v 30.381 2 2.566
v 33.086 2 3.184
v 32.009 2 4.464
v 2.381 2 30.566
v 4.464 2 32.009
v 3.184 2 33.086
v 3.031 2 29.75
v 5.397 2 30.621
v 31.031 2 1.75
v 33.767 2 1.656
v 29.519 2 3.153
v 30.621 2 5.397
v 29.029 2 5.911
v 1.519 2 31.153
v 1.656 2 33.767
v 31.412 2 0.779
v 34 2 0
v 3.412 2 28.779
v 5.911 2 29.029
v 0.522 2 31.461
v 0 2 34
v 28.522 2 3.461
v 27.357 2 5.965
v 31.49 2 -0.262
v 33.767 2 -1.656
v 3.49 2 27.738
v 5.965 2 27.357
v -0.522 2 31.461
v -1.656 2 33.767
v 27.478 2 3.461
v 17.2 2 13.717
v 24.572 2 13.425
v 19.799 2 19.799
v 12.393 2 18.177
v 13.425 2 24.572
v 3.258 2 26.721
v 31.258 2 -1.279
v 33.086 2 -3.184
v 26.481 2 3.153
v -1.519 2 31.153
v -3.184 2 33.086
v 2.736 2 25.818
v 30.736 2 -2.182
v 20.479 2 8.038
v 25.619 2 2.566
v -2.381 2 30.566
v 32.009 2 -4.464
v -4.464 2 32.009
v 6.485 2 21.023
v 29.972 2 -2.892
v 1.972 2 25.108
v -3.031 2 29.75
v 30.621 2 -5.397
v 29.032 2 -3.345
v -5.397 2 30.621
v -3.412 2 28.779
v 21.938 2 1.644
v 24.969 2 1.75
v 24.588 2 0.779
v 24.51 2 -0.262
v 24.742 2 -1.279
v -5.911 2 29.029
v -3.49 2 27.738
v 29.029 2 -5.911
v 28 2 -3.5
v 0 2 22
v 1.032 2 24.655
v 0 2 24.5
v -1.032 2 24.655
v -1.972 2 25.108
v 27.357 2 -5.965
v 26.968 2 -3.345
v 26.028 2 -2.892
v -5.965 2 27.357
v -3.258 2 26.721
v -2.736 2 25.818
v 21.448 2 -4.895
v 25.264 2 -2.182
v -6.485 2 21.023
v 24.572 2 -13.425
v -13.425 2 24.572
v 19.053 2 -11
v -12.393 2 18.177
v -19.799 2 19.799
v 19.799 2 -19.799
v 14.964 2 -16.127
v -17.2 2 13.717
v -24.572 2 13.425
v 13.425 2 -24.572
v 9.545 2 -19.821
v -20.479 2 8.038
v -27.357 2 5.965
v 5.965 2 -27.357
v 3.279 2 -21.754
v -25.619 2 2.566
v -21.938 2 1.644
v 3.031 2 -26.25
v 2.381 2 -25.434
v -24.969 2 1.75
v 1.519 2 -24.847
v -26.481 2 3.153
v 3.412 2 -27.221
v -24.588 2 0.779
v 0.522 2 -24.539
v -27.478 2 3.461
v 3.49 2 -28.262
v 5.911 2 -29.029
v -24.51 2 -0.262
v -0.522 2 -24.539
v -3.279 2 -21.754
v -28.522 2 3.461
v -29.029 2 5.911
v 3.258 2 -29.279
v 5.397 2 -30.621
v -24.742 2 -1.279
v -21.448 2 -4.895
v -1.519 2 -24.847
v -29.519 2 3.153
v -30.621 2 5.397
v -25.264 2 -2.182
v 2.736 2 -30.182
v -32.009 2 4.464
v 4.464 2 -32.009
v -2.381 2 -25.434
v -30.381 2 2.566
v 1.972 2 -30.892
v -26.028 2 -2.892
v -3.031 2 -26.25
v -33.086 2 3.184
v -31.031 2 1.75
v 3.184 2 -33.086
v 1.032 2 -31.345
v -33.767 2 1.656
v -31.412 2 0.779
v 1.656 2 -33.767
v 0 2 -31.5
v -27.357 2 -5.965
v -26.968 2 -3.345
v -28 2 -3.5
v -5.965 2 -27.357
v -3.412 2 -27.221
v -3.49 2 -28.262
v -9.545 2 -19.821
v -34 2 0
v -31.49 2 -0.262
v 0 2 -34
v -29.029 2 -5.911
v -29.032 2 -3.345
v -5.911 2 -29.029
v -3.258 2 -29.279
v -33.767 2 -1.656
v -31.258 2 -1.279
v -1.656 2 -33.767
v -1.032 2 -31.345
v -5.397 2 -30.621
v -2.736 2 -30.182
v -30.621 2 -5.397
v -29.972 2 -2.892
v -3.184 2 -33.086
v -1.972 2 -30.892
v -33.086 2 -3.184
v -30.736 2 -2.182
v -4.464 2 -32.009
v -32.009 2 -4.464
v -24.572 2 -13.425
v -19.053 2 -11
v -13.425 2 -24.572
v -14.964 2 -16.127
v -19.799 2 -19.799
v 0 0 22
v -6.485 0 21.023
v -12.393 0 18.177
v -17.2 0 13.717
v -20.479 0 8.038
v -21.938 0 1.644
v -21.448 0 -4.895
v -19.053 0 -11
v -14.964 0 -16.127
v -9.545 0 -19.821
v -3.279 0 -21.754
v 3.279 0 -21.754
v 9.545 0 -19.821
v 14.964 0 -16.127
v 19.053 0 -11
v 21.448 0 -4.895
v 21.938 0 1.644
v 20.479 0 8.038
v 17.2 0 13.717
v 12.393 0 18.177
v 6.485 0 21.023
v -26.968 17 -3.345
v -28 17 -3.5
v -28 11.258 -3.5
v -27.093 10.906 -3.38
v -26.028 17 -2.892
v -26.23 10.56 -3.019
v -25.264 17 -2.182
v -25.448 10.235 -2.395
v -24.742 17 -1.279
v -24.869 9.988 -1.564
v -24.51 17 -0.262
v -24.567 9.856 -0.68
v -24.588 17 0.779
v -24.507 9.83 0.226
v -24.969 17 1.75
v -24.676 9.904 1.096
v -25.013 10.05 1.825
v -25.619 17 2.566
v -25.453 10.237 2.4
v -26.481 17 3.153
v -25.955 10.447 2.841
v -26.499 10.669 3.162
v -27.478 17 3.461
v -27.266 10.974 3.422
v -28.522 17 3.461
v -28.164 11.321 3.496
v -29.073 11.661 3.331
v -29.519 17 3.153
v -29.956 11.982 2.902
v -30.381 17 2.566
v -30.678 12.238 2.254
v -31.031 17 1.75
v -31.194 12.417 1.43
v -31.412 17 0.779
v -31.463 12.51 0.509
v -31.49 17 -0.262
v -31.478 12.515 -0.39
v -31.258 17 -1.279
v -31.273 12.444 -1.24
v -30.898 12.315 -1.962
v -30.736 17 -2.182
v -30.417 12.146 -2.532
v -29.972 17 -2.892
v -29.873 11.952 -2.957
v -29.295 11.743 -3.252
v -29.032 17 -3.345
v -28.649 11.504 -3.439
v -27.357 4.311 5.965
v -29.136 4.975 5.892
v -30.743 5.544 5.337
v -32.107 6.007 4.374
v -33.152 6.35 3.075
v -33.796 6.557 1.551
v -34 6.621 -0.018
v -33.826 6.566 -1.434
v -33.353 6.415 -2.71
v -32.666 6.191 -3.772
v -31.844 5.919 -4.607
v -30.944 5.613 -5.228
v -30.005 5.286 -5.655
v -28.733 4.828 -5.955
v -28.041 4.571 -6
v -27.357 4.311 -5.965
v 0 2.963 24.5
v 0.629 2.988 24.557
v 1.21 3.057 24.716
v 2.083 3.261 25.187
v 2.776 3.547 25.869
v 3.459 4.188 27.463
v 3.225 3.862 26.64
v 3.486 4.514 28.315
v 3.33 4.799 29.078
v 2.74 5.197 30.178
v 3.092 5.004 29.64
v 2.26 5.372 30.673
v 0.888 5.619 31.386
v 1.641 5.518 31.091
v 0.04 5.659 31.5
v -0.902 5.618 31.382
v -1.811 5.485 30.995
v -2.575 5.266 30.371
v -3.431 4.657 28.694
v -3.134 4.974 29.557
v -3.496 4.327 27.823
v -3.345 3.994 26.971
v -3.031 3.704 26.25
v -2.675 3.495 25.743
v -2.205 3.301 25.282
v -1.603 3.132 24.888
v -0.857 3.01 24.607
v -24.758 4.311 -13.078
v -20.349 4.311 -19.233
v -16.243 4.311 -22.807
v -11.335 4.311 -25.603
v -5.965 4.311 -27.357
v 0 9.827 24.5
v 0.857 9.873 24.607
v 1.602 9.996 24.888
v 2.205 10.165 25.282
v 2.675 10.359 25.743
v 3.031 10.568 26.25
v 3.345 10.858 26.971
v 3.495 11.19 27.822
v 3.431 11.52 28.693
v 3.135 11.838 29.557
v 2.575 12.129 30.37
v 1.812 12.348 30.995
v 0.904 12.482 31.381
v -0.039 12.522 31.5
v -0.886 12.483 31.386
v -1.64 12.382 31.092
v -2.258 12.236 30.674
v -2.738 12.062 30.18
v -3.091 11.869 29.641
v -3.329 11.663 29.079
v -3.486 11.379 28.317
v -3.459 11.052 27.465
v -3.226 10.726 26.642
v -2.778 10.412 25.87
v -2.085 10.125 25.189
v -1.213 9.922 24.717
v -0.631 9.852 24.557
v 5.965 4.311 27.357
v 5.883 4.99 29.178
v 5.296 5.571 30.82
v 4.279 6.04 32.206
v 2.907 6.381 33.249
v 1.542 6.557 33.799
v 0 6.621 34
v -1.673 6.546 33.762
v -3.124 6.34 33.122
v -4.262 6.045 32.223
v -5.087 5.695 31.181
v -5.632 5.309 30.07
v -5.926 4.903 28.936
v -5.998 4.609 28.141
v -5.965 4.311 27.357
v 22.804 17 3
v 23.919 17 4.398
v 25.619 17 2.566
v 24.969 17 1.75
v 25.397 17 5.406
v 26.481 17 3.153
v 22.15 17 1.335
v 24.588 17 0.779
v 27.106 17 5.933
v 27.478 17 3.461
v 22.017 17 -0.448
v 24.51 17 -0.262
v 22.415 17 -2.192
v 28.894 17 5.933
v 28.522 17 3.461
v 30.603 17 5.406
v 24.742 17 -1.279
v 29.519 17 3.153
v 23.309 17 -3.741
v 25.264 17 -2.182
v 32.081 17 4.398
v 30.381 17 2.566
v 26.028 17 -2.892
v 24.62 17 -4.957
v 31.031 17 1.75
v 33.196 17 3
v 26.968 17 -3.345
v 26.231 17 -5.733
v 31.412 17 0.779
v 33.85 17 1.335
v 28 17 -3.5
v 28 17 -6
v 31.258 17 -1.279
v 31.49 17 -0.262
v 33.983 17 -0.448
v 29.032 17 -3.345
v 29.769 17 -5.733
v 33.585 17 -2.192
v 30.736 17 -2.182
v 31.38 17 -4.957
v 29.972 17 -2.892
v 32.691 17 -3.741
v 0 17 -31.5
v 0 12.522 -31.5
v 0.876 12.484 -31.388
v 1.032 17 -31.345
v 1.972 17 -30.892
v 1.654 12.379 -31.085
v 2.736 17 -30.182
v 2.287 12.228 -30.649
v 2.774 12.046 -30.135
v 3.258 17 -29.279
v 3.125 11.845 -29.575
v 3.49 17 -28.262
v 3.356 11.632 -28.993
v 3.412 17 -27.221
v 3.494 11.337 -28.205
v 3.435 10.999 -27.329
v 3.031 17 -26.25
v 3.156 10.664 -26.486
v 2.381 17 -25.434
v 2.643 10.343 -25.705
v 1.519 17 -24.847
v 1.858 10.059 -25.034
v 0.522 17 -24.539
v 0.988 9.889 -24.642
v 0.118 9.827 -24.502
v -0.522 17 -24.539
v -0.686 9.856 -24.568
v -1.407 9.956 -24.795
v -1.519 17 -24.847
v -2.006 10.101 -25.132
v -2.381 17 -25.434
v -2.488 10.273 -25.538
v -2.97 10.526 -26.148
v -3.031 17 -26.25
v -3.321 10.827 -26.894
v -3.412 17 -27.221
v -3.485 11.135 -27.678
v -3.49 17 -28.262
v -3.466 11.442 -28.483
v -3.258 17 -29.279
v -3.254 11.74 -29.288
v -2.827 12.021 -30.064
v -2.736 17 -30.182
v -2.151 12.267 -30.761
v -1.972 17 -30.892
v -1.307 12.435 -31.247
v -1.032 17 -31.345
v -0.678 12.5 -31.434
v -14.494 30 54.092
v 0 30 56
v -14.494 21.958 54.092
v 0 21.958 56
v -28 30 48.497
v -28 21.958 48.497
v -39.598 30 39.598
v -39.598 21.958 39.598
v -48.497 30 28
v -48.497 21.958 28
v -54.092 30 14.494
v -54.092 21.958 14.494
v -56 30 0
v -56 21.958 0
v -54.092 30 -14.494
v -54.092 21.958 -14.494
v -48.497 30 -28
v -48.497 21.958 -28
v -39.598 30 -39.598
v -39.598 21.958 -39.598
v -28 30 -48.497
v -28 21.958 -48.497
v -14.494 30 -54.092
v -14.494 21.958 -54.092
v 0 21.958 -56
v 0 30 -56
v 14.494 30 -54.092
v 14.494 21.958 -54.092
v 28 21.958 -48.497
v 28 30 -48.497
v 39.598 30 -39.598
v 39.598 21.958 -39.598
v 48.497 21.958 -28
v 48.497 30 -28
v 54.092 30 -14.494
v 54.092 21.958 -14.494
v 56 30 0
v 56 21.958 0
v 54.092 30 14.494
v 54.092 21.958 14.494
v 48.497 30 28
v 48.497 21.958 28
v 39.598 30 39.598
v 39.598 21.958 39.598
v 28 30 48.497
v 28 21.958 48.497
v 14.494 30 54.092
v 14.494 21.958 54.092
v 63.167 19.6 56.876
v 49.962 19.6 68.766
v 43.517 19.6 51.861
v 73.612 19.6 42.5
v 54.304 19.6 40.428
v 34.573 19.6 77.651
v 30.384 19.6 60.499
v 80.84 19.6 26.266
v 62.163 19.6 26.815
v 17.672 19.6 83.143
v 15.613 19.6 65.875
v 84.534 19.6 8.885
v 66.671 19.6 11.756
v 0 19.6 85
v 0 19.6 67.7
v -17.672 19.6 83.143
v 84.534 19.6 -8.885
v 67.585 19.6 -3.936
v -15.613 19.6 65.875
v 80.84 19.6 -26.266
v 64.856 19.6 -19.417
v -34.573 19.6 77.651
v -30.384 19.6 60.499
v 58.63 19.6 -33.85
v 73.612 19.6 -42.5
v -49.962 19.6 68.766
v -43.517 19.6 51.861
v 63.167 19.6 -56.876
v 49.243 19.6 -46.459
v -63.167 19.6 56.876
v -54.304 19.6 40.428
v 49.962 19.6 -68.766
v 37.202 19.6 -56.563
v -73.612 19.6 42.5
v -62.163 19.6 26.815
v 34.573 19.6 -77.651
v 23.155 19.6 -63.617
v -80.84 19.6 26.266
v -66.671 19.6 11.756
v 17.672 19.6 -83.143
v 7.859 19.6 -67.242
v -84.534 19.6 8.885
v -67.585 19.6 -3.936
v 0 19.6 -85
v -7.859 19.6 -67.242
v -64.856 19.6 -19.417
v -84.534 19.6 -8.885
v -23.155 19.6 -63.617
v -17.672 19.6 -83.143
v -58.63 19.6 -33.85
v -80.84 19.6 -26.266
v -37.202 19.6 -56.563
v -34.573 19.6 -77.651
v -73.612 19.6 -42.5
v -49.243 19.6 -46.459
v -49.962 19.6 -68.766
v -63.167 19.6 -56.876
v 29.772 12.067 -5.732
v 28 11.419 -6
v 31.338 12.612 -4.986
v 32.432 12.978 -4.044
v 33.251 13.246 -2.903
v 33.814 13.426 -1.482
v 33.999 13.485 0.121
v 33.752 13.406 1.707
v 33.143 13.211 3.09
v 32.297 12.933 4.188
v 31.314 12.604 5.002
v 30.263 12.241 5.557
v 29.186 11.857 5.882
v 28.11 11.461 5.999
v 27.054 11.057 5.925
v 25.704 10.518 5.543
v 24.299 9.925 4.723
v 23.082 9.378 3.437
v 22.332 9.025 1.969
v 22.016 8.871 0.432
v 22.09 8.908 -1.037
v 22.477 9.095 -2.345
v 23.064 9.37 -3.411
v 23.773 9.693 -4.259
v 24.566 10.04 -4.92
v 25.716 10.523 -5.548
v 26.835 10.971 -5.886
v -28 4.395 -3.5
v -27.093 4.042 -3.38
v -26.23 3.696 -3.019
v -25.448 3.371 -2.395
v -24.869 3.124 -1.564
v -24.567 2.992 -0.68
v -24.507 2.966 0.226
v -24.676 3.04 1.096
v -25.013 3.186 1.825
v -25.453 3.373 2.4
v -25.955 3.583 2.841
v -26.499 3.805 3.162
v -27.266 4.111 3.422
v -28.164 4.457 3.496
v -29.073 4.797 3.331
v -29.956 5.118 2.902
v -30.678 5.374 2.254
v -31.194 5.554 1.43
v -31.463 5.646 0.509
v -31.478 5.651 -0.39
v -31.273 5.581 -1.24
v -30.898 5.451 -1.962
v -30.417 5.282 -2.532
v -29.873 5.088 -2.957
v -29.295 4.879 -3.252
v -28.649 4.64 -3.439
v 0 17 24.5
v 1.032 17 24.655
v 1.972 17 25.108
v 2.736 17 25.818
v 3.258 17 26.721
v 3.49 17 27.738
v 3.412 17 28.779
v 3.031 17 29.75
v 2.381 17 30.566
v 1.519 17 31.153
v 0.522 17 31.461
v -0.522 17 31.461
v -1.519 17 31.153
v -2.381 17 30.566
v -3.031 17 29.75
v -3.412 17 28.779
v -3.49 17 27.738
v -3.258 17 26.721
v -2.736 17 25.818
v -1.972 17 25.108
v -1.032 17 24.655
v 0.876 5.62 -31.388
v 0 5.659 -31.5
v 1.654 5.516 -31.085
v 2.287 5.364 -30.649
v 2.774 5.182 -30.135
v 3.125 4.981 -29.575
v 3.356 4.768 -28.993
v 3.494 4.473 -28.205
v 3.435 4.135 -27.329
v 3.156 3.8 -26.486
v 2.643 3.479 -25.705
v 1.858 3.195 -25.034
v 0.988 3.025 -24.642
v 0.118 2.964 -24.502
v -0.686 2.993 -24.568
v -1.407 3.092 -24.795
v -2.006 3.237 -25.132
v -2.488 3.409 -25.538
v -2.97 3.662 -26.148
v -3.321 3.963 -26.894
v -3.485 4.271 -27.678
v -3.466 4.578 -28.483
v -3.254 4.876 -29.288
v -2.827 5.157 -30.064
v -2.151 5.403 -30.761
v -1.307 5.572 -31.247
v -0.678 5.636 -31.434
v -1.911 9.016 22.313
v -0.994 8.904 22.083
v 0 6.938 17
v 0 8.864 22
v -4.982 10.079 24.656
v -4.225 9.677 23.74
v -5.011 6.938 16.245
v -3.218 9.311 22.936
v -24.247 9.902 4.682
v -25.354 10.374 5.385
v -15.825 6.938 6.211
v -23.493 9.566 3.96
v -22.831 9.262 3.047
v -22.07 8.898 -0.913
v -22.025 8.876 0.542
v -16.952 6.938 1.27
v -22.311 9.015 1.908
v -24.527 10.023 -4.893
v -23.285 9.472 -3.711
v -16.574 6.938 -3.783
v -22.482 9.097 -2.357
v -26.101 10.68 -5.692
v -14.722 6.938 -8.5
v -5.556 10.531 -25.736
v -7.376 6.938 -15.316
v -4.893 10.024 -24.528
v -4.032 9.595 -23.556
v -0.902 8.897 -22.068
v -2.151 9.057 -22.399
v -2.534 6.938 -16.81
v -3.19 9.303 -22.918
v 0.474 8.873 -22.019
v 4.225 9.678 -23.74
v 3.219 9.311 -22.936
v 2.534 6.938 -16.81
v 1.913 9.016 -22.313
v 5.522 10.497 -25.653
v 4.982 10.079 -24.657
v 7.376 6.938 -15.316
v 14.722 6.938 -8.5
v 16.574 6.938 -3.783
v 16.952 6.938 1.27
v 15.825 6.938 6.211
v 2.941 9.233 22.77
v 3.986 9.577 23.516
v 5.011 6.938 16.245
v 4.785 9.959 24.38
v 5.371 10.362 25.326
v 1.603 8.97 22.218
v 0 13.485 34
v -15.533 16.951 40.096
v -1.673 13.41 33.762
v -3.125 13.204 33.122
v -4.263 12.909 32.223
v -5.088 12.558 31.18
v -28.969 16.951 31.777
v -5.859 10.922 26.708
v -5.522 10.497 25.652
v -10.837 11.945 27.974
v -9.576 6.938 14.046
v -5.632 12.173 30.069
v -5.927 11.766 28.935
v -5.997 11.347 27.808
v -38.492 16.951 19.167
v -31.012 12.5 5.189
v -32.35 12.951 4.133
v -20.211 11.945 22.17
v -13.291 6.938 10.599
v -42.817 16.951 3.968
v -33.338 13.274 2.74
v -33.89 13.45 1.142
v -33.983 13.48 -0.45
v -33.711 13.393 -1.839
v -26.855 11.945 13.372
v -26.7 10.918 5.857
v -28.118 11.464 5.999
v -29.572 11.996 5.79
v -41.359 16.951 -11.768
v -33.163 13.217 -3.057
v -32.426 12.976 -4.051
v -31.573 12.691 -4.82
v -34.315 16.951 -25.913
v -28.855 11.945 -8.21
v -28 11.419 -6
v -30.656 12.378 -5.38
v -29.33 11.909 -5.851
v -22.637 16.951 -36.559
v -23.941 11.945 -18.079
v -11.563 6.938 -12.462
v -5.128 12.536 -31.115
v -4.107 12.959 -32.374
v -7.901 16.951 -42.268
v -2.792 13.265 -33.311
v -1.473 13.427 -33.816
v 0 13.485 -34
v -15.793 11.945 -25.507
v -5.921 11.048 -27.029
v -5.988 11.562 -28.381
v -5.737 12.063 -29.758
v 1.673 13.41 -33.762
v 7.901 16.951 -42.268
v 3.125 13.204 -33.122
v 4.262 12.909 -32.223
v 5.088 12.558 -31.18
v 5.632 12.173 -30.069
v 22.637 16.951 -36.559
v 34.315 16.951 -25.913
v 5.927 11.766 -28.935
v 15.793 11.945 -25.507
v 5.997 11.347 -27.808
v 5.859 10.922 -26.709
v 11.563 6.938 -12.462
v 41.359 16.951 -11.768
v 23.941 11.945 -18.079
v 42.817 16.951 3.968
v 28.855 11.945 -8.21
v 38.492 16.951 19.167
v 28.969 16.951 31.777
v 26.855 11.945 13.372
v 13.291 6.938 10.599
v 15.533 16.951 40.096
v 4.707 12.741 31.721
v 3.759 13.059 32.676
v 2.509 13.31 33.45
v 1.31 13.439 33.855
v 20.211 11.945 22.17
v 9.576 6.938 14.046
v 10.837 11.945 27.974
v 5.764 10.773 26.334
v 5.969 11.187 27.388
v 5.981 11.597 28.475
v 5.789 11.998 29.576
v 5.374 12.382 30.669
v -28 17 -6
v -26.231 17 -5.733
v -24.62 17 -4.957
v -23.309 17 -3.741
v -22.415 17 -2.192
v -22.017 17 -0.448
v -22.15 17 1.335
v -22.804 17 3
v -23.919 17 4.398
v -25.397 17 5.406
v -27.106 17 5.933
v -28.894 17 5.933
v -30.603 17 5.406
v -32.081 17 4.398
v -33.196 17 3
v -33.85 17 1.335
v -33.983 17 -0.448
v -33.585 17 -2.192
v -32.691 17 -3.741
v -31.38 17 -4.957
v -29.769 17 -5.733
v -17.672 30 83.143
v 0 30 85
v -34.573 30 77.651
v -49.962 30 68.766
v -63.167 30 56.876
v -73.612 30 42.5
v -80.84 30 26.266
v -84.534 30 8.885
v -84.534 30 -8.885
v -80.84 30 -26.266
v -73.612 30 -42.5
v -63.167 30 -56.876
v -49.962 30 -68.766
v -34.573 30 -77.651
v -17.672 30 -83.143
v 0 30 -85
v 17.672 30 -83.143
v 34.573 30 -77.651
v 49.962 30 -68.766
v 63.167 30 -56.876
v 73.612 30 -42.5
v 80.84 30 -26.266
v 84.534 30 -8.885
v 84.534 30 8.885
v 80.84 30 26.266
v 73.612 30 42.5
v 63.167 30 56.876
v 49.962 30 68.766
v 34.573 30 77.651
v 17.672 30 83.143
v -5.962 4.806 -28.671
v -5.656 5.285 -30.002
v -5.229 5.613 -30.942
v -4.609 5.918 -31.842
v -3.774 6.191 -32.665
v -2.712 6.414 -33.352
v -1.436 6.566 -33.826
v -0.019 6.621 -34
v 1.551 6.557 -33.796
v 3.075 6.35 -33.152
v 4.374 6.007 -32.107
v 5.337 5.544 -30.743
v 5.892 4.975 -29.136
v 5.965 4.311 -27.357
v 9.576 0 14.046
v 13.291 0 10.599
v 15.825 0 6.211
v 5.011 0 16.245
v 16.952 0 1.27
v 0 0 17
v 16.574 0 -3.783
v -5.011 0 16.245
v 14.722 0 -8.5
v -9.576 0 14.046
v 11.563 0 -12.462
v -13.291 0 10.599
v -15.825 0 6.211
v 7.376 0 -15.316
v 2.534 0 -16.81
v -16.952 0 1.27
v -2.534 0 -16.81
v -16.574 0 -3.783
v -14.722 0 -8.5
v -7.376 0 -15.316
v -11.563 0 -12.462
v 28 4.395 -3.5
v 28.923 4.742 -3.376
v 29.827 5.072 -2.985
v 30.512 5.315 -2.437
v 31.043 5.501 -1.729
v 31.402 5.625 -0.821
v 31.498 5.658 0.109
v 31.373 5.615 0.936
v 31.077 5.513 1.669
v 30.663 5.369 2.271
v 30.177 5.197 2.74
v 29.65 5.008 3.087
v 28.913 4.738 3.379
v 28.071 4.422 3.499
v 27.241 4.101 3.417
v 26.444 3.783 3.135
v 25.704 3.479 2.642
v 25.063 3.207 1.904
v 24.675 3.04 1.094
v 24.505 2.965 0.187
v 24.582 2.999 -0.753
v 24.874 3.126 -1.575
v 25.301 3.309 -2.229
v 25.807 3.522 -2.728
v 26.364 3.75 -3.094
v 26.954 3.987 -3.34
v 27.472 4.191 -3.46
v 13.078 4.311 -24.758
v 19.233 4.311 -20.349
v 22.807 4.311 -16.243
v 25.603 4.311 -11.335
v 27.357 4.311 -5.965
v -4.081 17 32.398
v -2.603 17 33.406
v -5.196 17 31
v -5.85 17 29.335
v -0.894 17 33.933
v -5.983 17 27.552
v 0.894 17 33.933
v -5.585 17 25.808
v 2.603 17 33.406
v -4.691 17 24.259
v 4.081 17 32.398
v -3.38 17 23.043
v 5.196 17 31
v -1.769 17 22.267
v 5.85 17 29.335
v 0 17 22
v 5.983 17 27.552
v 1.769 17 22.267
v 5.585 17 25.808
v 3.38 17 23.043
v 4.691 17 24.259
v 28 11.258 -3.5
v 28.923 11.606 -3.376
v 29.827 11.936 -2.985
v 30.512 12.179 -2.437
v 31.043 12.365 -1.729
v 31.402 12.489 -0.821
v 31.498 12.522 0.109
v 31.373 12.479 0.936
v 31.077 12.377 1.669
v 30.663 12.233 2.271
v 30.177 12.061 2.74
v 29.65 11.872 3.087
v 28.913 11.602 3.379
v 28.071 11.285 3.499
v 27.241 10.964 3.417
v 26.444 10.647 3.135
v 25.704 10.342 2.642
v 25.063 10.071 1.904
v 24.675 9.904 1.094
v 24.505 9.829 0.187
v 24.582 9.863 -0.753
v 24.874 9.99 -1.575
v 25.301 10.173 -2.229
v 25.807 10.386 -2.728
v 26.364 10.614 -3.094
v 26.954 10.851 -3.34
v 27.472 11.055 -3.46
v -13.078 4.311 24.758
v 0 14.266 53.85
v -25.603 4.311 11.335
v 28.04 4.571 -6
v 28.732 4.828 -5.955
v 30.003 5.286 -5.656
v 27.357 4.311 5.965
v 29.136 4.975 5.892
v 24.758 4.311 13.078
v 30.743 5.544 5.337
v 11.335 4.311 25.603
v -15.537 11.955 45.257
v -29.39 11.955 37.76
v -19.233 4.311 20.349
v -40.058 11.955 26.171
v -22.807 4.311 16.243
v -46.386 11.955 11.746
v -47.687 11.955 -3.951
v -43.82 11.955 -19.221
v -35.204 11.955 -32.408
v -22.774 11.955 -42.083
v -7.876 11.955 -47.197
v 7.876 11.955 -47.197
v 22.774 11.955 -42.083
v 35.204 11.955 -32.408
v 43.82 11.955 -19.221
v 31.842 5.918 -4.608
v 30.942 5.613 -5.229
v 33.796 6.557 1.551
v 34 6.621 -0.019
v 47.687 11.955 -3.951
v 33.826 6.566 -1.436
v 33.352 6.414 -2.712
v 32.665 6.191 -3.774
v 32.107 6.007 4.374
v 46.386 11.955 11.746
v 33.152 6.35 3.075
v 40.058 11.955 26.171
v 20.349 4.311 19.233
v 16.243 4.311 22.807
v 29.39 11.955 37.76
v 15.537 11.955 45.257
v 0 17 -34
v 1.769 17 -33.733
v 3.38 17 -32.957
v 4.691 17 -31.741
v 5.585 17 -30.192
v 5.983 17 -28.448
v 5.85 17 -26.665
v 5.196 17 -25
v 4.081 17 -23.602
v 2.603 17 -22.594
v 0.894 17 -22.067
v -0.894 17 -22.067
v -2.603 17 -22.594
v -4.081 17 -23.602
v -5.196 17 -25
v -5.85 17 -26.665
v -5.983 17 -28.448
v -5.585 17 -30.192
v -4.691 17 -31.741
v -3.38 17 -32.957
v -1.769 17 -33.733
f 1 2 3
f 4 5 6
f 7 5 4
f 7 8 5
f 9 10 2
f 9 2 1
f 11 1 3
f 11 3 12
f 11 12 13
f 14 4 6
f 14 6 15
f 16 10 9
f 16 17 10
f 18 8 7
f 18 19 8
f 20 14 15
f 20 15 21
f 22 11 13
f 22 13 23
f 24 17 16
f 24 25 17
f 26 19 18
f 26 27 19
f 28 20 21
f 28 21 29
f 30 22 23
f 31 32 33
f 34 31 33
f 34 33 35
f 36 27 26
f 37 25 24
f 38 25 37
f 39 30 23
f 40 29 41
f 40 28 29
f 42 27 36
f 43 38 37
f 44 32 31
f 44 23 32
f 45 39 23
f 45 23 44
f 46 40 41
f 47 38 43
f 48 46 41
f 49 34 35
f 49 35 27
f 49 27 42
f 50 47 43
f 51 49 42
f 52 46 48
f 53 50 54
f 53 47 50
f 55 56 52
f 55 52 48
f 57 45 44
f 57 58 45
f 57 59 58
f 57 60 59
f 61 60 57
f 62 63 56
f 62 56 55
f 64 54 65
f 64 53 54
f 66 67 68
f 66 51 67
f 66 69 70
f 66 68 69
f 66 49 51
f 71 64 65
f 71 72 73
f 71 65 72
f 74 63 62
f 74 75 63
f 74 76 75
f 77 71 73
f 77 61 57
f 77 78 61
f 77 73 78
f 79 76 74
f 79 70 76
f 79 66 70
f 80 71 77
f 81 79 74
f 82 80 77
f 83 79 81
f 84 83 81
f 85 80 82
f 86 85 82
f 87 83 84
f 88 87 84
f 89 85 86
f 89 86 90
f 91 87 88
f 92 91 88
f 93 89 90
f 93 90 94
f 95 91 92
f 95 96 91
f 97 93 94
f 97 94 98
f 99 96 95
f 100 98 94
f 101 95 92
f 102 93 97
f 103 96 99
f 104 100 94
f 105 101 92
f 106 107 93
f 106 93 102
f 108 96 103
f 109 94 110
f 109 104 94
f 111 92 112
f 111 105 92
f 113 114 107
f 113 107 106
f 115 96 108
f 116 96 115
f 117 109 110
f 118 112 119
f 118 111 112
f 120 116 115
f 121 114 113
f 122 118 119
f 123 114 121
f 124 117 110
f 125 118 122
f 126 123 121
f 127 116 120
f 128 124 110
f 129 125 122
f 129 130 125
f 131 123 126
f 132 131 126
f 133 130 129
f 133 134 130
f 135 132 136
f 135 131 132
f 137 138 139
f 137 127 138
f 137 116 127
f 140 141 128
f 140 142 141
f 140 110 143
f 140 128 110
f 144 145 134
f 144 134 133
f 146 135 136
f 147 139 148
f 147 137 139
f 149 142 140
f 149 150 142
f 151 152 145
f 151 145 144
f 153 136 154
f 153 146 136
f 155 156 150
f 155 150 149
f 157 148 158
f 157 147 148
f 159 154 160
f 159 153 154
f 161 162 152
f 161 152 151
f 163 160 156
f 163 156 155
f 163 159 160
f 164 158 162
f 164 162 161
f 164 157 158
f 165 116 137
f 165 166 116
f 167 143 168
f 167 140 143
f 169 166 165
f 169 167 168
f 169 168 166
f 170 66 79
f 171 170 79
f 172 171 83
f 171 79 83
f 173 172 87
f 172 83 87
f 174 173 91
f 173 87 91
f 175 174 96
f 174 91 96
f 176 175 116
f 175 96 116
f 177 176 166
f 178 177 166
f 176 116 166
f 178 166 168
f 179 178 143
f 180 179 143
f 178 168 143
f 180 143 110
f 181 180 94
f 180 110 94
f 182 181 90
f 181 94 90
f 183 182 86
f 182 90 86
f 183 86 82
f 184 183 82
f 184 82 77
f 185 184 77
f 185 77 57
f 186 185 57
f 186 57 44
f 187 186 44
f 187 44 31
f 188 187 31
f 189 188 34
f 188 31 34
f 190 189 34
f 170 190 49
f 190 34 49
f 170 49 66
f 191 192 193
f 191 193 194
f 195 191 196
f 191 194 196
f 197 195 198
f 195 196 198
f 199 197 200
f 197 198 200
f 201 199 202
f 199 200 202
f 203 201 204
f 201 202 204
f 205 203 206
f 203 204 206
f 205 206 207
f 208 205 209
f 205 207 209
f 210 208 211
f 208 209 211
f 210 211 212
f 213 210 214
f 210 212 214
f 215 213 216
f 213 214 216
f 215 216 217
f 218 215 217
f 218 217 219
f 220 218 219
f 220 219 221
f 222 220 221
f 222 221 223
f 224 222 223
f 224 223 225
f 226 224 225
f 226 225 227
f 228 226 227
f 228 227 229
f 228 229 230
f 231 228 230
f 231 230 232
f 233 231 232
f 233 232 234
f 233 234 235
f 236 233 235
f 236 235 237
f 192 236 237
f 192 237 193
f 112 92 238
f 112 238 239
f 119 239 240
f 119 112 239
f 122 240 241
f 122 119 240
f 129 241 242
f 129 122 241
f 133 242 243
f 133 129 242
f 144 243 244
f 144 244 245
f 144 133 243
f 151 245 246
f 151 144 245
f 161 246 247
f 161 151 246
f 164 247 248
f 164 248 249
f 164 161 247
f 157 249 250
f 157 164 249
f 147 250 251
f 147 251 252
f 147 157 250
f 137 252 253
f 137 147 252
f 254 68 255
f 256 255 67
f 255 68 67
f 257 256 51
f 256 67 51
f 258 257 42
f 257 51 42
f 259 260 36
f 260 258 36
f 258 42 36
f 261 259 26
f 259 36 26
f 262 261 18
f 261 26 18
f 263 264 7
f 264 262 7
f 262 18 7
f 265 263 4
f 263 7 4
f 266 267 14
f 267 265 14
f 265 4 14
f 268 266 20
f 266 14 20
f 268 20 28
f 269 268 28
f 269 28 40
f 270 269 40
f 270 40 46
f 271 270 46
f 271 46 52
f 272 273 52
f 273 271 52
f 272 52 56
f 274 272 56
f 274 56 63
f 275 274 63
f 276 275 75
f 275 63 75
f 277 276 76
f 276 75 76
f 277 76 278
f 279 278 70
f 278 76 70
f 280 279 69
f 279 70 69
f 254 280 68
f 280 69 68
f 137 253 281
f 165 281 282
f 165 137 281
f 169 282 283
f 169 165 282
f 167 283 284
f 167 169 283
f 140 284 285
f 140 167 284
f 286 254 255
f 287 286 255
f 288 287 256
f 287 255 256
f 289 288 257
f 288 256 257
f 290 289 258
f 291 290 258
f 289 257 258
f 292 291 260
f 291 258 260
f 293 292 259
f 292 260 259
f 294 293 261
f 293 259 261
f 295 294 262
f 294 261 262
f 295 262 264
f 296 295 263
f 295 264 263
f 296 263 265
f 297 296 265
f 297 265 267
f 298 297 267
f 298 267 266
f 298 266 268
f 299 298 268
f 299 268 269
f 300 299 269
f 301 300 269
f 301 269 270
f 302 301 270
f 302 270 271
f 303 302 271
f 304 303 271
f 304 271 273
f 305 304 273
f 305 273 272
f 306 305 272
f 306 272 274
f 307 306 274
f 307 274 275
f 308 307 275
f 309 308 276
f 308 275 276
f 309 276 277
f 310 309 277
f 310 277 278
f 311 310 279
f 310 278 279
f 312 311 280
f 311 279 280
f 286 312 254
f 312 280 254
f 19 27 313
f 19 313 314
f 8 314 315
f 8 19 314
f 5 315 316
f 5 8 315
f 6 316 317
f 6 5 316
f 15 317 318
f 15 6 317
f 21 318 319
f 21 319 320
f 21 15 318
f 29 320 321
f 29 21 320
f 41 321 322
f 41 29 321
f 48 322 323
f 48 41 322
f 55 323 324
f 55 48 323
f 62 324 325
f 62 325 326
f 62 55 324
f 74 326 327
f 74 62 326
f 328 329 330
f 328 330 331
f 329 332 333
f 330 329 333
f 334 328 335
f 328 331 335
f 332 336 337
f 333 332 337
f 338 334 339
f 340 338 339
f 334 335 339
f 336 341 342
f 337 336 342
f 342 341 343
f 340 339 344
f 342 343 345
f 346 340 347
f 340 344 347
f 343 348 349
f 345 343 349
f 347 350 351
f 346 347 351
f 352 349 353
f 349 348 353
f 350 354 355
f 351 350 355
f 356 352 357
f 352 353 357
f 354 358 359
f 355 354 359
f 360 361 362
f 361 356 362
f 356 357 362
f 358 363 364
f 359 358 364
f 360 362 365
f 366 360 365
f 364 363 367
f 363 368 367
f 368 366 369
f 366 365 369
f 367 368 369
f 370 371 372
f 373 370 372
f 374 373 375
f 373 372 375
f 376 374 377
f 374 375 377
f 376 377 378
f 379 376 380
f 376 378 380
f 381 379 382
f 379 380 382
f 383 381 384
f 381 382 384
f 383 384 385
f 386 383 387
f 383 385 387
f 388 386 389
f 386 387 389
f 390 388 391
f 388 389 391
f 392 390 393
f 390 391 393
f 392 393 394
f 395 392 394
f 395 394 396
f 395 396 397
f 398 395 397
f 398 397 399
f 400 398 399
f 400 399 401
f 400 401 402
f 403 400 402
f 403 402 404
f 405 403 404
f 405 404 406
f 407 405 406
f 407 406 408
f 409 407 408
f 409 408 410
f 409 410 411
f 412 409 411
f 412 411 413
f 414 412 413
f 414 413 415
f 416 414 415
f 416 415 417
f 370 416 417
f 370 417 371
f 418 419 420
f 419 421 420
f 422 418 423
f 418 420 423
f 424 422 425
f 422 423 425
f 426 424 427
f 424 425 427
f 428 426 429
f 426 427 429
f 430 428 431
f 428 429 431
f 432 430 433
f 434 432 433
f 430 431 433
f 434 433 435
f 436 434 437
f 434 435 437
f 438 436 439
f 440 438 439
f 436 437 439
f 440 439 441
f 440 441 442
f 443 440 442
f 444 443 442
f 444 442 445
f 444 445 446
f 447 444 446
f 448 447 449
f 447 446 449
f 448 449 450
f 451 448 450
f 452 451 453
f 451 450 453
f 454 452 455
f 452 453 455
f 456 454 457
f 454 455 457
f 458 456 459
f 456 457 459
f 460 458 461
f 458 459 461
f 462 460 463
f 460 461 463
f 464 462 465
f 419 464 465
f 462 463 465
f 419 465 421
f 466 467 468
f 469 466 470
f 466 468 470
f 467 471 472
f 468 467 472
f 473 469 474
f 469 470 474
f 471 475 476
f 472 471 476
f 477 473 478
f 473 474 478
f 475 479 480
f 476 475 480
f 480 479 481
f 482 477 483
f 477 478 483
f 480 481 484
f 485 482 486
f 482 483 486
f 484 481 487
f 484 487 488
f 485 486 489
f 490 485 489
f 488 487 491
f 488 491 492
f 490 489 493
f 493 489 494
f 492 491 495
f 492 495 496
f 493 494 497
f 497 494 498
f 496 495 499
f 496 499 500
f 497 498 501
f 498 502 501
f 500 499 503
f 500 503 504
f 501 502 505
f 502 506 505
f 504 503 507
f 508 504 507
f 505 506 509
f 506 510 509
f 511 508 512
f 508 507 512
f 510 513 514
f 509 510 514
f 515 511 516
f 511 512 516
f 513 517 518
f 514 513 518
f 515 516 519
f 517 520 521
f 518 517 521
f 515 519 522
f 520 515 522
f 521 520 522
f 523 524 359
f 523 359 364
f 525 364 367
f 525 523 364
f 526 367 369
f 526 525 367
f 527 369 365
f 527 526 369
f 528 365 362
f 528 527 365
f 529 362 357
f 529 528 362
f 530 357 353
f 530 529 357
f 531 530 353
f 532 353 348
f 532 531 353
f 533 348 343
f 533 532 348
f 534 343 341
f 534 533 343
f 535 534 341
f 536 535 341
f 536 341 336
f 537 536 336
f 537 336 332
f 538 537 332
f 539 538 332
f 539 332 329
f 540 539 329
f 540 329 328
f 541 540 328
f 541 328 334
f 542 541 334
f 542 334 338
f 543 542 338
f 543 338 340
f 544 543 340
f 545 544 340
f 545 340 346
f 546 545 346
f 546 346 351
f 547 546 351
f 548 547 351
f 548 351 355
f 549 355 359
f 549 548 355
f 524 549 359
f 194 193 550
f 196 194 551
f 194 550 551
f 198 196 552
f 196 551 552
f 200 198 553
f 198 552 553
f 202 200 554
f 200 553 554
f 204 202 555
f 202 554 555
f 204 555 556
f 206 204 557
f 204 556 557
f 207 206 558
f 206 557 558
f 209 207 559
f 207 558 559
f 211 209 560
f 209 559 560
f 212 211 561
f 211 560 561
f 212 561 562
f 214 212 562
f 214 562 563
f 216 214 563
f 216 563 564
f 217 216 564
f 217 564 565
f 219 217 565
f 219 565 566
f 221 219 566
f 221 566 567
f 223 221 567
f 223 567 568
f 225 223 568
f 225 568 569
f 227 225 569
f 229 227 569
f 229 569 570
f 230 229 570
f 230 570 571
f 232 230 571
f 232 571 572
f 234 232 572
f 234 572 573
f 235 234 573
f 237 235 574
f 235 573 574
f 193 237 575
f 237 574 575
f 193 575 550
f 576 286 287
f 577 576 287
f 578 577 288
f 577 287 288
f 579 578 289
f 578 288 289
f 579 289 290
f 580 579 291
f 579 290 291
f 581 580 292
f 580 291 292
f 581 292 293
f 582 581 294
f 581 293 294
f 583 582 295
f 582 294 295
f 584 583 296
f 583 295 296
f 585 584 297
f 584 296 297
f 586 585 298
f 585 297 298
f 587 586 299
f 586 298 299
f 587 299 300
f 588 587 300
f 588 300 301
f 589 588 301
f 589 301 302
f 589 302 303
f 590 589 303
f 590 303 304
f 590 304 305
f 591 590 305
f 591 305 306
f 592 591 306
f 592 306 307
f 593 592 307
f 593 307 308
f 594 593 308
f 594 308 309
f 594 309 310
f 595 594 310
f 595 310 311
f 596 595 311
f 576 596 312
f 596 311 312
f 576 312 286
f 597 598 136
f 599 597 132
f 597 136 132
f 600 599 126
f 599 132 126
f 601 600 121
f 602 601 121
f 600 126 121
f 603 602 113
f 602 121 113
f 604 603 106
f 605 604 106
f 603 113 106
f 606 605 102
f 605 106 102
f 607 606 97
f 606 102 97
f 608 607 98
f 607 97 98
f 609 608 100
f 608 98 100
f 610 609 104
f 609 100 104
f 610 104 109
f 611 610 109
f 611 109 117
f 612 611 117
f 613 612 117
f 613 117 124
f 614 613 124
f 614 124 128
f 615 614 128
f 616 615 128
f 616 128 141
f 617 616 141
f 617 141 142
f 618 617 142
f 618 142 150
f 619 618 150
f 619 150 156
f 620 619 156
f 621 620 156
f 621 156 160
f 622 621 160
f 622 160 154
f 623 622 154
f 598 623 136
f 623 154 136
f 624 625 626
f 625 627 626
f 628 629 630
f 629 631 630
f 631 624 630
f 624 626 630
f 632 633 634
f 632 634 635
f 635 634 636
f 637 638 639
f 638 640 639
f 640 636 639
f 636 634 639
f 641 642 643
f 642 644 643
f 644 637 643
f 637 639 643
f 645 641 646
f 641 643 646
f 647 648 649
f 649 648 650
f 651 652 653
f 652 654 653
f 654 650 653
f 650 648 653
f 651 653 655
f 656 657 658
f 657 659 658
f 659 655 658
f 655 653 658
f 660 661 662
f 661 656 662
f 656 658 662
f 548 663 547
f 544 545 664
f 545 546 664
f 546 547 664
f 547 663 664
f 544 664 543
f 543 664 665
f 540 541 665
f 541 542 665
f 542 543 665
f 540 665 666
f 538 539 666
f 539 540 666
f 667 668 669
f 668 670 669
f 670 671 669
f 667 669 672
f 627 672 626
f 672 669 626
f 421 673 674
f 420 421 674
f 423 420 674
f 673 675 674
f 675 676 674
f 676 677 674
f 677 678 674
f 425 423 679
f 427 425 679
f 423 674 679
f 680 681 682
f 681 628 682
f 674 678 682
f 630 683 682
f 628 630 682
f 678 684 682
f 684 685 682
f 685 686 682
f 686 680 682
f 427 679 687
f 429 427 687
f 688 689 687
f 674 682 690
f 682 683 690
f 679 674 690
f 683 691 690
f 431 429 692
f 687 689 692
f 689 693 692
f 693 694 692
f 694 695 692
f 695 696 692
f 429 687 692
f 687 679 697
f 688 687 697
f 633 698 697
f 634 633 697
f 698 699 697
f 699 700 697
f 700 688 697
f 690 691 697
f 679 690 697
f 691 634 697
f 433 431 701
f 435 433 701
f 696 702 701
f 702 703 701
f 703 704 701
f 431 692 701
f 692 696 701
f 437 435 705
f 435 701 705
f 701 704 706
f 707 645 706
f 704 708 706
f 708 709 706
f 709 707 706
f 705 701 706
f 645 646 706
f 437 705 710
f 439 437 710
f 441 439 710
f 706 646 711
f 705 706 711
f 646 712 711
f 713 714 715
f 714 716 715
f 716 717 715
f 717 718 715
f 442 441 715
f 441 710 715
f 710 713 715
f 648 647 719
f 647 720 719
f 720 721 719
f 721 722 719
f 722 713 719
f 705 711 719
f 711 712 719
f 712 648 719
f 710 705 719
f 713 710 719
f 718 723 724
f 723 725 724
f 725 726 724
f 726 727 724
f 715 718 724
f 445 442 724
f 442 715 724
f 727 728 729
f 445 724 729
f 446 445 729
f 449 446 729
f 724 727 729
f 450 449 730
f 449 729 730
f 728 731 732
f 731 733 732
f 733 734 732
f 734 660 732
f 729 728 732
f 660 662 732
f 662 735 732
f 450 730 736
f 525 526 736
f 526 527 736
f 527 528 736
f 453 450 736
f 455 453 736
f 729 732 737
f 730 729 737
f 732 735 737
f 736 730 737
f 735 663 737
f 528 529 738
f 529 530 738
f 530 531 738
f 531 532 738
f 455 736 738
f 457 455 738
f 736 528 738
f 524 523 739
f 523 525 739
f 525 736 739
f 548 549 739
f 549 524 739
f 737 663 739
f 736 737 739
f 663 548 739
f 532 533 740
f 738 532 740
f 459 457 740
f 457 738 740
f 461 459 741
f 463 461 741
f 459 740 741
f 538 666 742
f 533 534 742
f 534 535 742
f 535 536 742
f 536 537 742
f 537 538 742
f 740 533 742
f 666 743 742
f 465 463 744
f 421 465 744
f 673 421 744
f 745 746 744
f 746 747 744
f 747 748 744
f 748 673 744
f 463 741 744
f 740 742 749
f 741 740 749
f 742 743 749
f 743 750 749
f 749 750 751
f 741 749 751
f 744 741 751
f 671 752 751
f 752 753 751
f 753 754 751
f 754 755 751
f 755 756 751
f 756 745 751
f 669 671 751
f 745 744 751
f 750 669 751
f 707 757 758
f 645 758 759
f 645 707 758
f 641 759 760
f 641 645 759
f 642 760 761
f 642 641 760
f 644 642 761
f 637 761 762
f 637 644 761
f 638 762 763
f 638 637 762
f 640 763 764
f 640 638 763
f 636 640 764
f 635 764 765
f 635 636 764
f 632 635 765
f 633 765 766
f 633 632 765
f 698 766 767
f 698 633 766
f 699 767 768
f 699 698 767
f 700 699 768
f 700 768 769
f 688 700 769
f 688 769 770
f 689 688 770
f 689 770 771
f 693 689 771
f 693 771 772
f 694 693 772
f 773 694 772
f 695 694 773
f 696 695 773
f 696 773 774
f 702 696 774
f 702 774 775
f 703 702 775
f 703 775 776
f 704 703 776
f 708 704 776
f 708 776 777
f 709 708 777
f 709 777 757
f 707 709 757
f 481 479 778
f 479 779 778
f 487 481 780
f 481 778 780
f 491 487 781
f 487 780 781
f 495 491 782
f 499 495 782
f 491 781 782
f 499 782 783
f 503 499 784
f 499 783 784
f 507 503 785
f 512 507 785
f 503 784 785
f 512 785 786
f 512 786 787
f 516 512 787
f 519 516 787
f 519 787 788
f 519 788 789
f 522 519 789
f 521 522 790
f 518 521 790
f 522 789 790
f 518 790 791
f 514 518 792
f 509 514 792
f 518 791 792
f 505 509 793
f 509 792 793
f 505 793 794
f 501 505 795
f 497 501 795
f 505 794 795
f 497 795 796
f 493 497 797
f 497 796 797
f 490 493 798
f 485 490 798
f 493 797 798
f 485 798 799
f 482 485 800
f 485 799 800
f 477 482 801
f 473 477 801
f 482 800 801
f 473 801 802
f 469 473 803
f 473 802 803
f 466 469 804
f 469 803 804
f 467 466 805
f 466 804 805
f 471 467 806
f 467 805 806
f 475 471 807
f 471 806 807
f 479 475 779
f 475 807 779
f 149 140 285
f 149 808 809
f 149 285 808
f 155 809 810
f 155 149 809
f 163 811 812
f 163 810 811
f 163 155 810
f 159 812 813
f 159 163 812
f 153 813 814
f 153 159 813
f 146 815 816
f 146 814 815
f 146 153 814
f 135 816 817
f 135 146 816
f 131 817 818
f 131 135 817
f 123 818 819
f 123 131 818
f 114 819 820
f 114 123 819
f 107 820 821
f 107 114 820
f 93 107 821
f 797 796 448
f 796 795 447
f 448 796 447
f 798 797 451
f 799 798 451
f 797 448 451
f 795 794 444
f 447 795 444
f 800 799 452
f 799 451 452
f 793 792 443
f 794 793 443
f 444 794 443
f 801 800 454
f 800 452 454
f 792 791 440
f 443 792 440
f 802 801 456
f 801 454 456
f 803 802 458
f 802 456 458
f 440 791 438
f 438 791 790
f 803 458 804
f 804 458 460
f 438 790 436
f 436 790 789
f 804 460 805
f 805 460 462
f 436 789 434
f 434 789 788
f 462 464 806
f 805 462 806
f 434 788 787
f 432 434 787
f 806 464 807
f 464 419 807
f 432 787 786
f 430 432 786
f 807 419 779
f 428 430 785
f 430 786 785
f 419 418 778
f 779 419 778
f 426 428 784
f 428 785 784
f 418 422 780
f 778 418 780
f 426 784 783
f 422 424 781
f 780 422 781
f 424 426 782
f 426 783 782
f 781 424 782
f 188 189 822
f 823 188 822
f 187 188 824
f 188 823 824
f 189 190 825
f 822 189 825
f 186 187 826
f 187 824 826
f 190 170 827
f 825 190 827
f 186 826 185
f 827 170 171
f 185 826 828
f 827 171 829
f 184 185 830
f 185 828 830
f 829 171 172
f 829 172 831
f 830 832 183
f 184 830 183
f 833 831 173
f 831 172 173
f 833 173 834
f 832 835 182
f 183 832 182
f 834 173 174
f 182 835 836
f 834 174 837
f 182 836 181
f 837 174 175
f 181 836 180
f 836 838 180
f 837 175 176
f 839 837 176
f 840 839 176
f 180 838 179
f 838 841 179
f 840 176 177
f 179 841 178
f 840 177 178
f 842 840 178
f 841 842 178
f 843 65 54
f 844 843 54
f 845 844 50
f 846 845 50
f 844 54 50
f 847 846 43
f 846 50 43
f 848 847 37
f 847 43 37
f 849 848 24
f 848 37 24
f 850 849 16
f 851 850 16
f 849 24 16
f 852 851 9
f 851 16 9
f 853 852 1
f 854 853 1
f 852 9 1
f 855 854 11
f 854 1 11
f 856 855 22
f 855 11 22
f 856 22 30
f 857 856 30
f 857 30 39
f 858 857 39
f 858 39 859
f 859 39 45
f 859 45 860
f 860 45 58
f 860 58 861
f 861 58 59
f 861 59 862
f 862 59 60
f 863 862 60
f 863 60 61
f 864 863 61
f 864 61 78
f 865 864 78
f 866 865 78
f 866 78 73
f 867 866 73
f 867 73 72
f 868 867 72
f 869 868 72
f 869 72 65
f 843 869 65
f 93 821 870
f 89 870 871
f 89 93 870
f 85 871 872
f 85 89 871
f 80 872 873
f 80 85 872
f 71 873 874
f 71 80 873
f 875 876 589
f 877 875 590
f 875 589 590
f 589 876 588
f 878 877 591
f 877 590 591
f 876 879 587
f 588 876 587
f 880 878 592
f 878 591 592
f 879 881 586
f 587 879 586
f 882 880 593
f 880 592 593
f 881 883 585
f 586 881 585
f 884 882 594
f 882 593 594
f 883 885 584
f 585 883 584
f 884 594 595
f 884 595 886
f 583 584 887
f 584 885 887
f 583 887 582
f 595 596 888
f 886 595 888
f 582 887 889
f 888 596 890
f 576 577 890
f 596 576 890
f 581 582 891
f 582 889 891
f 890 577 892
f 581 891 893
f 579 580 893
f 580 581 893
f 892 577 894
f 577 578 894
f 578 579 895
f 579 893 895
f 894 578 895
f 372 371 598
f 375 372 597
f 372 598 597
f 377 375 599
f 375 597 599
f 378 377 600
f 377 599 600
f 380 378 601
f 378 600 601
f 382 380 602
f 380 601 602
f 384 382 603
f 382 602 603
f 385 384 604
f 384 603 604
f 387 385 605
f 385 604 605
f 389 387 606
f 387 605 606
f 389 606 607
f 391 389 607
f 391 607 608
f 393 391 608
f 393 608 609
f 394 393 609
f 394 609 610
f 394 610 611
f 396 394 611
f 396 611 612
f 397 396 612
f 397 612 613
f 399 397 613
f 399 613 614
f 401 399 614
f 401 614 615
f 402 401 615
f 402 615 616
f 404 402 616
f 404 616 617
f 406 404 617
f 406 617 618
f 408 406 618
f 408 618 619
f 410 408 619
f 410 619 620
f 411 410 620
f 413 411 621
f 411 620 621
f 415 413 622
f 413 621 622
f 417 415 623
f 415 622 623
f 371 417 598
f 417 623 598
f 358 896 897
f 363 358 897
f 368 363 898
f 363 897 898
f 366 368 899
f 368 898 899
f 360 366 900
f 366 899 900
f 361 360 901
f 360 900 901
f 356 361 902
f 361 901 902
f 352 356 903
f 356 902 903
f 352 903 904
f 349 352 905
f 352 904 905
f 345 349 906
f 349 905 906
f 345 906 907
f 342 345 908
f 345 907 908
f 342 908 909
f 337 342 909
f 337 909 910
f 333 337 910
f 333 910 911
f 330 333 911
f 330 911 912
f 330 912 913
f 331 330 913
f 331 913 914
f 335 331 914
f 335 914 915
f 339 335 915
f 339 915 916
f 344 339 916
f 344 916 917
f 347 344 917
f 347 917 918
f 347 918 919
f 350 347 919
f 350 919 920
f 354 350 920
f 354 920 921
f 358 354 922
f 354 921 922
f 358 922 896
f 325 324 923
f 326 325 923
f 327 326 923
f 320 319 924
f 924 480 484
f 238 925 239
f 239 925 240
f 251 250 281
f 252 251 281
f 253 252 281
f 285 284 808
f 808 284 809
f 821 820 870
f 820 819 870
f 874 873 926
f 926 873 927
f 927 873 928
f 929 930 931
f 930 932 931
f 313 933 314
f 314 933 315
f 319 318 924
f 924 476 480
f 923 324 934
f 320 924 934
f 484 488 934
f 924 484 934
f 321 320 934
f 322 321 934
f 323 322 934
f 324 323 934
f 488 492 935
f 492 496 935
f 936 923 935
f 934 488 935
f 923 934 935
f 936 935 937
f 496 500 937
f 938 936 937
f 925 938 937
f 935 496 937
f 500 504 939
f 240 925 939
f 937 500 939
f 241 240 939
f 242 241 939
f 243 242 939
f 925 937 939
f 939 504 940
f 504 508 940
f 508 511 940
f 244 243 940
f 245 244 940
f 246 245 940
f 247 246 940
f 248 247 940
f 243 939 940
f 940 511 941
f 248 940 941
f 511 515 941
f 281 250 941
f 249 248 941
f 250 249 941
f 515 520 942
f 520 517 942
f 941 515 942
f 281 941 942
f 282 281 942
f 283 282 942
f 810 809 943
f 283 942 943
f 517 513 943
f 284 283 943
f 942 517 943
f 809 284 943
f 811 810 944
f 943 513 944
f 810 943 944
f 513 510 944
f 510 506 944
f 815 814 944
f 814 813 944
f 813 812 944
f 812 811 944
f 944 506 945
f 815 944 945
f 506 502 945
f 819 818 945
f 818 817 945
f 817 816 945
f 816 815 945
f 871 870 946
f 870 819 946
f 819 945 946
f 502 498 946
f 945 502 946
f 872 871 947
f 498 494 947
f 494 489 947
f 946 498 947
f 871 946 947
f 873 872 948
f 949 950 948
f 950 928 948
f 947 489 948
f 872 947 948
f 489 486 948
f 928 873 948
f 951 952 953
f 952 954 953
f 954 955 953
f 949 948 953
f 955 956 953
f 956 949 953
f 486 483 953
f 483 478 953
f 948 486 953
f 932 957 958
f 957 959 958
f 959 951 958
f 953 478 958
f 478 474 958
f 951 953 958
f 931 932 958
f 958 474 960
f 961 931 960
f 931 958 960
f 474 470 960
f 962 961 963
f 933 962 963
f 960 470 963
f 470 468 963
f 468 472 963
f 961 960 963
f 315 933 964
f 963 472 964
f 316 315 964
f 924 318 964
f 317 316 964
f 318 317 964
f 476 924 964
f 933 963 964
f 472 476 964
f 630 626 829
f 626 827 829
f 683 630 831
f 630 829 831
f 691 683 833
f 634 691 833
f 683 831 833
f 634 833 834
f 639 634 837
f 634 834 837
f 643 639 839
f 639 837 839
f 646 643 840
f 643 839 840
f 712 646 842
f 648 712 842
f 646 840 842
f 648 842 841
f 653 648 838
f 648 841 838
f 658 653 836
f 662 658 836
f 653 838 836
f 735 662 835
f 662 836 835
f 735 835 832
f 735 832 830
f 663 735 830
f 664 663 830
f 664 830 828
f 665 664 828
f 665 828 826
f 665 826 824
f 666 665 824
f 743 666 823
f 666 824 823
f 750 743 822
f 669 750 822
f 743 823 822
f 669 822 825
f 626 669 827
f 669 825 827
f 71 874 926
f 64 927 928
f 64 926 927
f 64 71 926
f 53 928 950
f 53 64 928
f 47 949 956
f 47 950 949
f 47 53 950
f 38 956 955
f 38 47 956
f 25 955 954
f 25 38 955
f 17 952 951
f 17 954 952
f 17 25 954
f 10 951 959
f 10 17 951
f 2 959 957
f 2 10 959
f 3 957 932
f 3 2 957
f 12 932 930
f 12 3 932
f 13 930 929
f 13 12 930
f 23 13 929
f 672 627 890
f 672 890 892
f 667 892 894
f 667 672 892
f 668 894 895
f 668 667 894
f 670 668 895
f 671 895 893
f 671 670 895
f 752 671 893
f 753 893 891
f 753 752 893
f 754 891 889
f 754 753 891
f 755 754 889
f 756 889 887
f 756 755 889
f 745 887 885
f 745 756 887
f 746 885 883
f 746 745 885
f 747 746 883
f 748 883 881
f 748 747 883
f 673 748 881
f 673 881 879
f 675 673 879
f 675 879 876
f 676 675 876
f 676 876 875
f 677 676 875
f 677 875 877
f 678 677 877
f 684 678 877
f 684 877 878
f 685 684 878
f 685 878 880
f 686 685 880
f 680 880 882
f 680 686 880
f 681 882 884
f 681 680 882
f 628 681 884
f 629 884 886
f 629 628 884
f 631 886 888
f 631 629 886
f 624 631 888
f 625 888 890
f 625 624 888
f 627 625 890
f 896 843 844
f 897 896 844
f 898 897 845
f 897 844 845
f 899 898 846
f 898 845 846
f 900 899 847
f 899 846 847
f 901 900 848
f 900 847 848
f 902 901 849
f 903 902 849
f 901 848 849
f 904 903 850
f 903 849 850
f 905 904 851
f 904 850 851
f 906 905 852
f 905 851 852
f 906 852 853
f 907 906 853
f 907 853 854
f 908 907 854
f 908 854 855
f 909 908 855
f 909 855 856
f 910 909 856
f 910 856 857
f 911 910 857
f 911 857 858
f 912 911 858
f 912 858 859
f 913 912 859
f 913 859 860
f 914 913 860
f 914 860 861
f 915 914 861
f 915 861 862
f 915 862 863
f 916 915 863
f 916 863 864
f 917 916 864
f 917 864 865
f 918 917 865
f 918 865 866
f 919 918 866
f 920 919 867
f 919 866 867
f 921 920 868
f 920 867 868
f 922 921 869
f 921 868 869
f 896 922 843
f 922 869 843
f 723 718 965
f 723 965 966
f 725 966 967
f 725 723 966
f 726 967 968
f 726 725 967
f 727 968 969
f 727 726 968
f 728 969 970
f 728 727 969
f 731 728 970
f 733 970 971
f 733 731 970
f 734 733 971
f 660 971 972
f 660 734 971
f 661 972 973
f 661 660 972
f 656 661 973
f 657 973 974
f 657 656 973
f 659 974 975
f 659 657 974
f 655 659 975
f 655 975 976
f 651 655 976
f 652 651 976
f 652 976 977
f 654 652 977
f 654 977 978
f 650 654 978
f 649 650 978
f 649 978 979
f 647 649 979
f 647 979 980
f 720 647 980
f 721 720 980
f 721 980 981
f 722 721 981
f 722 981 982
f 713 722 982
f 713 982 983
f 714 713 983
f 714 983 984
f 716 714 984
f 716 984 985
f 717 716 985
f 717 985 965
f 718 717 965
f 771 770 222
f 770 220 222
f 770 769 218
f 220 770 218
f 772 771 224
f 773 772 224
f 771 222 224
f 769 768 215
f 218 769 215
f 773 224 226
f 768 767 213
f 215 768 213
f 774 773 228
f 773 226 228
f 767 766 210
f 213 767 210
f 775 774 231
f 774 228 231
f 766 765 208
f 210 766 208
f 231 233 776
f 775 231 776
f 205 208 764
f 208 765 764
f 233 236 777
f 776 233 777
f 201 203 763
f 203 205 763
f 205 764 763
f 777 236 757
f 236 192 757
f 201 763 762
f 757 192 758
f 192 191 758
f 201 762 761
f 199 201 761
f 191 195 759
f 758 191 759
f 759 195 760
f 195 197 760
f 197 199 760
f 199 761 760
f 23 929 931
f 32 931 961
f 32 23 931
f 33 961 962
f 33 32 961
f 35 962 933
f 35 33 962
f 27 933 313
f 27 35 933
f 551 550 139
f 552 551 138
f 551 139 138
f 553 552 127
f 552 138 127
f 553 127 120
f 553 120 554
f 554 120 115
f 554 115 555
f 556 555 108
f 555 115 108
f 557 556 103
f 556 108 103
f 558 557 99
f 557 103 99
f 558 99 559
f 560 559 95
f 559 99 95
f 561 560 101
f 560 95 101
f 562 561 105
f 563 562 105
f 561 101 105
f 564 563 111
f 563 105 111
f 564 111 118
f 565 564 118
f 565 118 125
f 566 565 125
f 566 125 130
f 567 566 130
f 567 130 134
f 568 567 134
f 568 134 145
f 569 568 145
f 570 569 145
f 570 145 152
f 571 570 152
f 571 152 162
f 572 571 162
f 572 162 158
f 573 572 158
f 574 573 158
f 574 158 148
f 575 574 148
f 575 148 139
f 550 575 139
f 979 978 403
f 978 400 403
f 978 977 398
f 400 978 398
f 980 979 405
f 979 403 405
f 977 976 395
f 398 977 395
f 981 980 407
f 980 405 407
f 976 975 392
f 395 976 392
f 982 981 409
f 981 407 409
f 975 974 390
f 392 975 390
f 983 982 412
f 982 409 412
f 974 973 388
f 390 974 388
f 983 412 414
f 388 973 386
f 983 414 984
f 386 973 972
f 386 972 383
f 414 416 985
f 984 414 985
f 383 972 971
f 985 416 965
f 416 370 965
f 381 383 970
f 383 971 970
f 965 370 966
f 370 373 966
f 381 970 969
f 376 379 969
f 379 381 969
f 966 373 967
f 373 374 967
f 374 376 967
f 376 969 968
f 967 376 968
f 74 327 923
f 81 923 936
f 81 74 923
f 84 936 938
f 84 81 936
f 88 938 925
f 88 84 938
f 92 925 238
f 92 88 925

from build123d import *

# Parameters (mm, degrees)
SKETCH2_R           = 6
SKETCH2_R_2         = 3.5
BOSS_EXTRUDE1_DEPTH = 15
BOSS_EXTRUDE2_REACH = 125.426
SKETCH3_R           = 6
SKETCH4_R           = 3.5
CUT_EXTRUDE1_DEPTH  = 124.426091245


with BuildPart() as part:
    # Sketch1 → Revolve1 (revolve)
    with BuildSketch(Plane.XY):
        Polygon((17, 0), (22, 0), (22, 2), (67.7, 19.6), (85, 19.6), (85, 30), (56, 30), (56, 21.957917656), (17, 6.938224002), align=None)
    revolve(axis=Axis((0, 29.247184332, 0), (0, -1, 0)))

    # Sketch2 → Boss-Extrude1 (add)
    # profile 1 of 4: a face of its own
    with BuildSketch(Plane(origin=(0, 2, 0), x_dir=(-1, 0, 0), z_dir=(0, -1, 0))):
        with Locations((0, 28)):
            Circle(SKETCH2_R)
        with Locations((0, 28)):
            Circle(SKETCH2_R_2, mode=Mode.SUBTRACT)
    # profile 2 of 4: a face of its own
    with BuildSketch(Plane(origin=(0, 2, 0), x_dir=(-1, 0, 0), z_dir=(0, -1, 0))):
        with Locations((28, 0)):
            Circle(SKETCH2_R)
        with Locations((28, 0)):
            Circle(SKETCH2_R_2, mode=Mode.SUBTRACT)
    # profile 3 of 4: a face of its own
    with BuildSketch(Plane(origin=(0, 2, 0), x_dir=(-1, 0, 0), z_dir=(0, -1, 0))):
        with Locations((0, -28)):
            Circle(SKETCH2_R)
        with Locations((0, -28)):
            Circle(SKETCH2_R_2, mode=Mode.SUBTRACT)
    # profile 4 of 4: a face of its own
    with BuildSketch(Plane(origin=(0, 2, 0), x_dir=(-1, 0, 0), z_dir=(0, -1, 0))):
        with Locations((-28, 0)):
            Circle(SKETCH2_R)
        with Locations((-28, 0)):
            Circle(SKETCH2_R_2, mode=Mode.SUBTRACT)
    extrude(amount=-BOSS_EXTRUDE1_DEPTH)

    # Boss-Extrude2: up to this cone (the profile starts outside it)
    boss_extrude2_end = Plane(origin=(0, 2, 0), z_dir=(0, 1, 0)).offset(-8.472646702) * Cone(2.597e-06, 406.103306818, 156.398646702, align=(Align.CENTER, Align.CENTER, Align.MIN), mode=Mode.PRIVATE)
    # Sketch3 → Boss-Extrude2 (add, up to the surface)
    with BuildSketch(Plane(origin=(0, 2, 0), x_dir=(-1, 0, 0), z_dir=(0, -1, 0)), mode=Mode.PRIVATE) as boss_extrude2_sk1:
        with BuildLine():
            ThreePointArc((-22, 0), (-23.535857145, -4.008918629), (-27.357142857, -5.965461817))
            ThreePointArc((-27.357142857, -5.965461817), (-19.798989873, -19.798989873), (-5.965461817, -27.357142857))
            ThreePointArc((-5.965461817, -27.357142857), (0, -22), (5.965461817, -27.357142857))
            ThreePointArc((5.965461817, -27.357142857), (19.798989873, -19.798989873), (27.357142857, -5.965461817))
            ThreePointArc((27.357142857, -5.965461817), (22, 0), (27.357142857, 5.965461817))
            ThreePointArc((27.357142857, 5.965461817), (19.798989873, 19.798989873), (5.965461817, 27.357142857))
            ThreePointArc((5.965461817, 27.357142857), (0, 22), (-5.965461817, 27.357142857))
            ThreePointArc((-5.965461817, 27.357142857), (-19.798989873, 19.798989873), (-27.357142857, 5.965461817))
            ThreePointArc((-27.357142857, 5.965461817), (-23.535857145, 4.008918629), (-22, 0))
        make_face()
        Circle(SKETCH3_R, mode=Mode.SUBTRACT)
    boss_extrude2_tool1 = extrude(boss_extrude2_sk1.sketch, amount=-BOSS_EXTRUDE2_REACH, mode=Mode.PRIVATE) - boss_extrude2_end
    add(boss_extrude2_tool1.solids().sort_by_distance((22.960149, 2, -4.52592))[0])
    add(boss_extrude2_tool1.solids().sort_by_distance((22.960149, 2, -4.52592))[1])
    add(boss_extrude2_tool1.solids().sort_by_distance((22.960149, 2, -4.52592))[2])
    add(boss_extrude2_tool1.solids().sort_by_distance((22.960149, 2, -4.52592))[3])

    # Sketch4 → Cut-Extrude1 (cut, through all)
    with BuildSketch(Plane(origin=(0, 2, 0), x_dir=(-1, 0, 0), z_dir=(0, -1, 0))):
        with Locations((0, 28)):
            Circle(SKETCH4_R)
        with Locations((28, 0)):
            Circle(SKETCH4_R)
        with Locations((0, -28)):
            Circle(SKETCH4_R)
        with Locations((-28, 0)):
            Circle(SKETCH4_R)
    extrude(amount=-CUT_EXTRUDE1_DEPTH, mode=Mode.SUBTRACT)


solid = part.part
